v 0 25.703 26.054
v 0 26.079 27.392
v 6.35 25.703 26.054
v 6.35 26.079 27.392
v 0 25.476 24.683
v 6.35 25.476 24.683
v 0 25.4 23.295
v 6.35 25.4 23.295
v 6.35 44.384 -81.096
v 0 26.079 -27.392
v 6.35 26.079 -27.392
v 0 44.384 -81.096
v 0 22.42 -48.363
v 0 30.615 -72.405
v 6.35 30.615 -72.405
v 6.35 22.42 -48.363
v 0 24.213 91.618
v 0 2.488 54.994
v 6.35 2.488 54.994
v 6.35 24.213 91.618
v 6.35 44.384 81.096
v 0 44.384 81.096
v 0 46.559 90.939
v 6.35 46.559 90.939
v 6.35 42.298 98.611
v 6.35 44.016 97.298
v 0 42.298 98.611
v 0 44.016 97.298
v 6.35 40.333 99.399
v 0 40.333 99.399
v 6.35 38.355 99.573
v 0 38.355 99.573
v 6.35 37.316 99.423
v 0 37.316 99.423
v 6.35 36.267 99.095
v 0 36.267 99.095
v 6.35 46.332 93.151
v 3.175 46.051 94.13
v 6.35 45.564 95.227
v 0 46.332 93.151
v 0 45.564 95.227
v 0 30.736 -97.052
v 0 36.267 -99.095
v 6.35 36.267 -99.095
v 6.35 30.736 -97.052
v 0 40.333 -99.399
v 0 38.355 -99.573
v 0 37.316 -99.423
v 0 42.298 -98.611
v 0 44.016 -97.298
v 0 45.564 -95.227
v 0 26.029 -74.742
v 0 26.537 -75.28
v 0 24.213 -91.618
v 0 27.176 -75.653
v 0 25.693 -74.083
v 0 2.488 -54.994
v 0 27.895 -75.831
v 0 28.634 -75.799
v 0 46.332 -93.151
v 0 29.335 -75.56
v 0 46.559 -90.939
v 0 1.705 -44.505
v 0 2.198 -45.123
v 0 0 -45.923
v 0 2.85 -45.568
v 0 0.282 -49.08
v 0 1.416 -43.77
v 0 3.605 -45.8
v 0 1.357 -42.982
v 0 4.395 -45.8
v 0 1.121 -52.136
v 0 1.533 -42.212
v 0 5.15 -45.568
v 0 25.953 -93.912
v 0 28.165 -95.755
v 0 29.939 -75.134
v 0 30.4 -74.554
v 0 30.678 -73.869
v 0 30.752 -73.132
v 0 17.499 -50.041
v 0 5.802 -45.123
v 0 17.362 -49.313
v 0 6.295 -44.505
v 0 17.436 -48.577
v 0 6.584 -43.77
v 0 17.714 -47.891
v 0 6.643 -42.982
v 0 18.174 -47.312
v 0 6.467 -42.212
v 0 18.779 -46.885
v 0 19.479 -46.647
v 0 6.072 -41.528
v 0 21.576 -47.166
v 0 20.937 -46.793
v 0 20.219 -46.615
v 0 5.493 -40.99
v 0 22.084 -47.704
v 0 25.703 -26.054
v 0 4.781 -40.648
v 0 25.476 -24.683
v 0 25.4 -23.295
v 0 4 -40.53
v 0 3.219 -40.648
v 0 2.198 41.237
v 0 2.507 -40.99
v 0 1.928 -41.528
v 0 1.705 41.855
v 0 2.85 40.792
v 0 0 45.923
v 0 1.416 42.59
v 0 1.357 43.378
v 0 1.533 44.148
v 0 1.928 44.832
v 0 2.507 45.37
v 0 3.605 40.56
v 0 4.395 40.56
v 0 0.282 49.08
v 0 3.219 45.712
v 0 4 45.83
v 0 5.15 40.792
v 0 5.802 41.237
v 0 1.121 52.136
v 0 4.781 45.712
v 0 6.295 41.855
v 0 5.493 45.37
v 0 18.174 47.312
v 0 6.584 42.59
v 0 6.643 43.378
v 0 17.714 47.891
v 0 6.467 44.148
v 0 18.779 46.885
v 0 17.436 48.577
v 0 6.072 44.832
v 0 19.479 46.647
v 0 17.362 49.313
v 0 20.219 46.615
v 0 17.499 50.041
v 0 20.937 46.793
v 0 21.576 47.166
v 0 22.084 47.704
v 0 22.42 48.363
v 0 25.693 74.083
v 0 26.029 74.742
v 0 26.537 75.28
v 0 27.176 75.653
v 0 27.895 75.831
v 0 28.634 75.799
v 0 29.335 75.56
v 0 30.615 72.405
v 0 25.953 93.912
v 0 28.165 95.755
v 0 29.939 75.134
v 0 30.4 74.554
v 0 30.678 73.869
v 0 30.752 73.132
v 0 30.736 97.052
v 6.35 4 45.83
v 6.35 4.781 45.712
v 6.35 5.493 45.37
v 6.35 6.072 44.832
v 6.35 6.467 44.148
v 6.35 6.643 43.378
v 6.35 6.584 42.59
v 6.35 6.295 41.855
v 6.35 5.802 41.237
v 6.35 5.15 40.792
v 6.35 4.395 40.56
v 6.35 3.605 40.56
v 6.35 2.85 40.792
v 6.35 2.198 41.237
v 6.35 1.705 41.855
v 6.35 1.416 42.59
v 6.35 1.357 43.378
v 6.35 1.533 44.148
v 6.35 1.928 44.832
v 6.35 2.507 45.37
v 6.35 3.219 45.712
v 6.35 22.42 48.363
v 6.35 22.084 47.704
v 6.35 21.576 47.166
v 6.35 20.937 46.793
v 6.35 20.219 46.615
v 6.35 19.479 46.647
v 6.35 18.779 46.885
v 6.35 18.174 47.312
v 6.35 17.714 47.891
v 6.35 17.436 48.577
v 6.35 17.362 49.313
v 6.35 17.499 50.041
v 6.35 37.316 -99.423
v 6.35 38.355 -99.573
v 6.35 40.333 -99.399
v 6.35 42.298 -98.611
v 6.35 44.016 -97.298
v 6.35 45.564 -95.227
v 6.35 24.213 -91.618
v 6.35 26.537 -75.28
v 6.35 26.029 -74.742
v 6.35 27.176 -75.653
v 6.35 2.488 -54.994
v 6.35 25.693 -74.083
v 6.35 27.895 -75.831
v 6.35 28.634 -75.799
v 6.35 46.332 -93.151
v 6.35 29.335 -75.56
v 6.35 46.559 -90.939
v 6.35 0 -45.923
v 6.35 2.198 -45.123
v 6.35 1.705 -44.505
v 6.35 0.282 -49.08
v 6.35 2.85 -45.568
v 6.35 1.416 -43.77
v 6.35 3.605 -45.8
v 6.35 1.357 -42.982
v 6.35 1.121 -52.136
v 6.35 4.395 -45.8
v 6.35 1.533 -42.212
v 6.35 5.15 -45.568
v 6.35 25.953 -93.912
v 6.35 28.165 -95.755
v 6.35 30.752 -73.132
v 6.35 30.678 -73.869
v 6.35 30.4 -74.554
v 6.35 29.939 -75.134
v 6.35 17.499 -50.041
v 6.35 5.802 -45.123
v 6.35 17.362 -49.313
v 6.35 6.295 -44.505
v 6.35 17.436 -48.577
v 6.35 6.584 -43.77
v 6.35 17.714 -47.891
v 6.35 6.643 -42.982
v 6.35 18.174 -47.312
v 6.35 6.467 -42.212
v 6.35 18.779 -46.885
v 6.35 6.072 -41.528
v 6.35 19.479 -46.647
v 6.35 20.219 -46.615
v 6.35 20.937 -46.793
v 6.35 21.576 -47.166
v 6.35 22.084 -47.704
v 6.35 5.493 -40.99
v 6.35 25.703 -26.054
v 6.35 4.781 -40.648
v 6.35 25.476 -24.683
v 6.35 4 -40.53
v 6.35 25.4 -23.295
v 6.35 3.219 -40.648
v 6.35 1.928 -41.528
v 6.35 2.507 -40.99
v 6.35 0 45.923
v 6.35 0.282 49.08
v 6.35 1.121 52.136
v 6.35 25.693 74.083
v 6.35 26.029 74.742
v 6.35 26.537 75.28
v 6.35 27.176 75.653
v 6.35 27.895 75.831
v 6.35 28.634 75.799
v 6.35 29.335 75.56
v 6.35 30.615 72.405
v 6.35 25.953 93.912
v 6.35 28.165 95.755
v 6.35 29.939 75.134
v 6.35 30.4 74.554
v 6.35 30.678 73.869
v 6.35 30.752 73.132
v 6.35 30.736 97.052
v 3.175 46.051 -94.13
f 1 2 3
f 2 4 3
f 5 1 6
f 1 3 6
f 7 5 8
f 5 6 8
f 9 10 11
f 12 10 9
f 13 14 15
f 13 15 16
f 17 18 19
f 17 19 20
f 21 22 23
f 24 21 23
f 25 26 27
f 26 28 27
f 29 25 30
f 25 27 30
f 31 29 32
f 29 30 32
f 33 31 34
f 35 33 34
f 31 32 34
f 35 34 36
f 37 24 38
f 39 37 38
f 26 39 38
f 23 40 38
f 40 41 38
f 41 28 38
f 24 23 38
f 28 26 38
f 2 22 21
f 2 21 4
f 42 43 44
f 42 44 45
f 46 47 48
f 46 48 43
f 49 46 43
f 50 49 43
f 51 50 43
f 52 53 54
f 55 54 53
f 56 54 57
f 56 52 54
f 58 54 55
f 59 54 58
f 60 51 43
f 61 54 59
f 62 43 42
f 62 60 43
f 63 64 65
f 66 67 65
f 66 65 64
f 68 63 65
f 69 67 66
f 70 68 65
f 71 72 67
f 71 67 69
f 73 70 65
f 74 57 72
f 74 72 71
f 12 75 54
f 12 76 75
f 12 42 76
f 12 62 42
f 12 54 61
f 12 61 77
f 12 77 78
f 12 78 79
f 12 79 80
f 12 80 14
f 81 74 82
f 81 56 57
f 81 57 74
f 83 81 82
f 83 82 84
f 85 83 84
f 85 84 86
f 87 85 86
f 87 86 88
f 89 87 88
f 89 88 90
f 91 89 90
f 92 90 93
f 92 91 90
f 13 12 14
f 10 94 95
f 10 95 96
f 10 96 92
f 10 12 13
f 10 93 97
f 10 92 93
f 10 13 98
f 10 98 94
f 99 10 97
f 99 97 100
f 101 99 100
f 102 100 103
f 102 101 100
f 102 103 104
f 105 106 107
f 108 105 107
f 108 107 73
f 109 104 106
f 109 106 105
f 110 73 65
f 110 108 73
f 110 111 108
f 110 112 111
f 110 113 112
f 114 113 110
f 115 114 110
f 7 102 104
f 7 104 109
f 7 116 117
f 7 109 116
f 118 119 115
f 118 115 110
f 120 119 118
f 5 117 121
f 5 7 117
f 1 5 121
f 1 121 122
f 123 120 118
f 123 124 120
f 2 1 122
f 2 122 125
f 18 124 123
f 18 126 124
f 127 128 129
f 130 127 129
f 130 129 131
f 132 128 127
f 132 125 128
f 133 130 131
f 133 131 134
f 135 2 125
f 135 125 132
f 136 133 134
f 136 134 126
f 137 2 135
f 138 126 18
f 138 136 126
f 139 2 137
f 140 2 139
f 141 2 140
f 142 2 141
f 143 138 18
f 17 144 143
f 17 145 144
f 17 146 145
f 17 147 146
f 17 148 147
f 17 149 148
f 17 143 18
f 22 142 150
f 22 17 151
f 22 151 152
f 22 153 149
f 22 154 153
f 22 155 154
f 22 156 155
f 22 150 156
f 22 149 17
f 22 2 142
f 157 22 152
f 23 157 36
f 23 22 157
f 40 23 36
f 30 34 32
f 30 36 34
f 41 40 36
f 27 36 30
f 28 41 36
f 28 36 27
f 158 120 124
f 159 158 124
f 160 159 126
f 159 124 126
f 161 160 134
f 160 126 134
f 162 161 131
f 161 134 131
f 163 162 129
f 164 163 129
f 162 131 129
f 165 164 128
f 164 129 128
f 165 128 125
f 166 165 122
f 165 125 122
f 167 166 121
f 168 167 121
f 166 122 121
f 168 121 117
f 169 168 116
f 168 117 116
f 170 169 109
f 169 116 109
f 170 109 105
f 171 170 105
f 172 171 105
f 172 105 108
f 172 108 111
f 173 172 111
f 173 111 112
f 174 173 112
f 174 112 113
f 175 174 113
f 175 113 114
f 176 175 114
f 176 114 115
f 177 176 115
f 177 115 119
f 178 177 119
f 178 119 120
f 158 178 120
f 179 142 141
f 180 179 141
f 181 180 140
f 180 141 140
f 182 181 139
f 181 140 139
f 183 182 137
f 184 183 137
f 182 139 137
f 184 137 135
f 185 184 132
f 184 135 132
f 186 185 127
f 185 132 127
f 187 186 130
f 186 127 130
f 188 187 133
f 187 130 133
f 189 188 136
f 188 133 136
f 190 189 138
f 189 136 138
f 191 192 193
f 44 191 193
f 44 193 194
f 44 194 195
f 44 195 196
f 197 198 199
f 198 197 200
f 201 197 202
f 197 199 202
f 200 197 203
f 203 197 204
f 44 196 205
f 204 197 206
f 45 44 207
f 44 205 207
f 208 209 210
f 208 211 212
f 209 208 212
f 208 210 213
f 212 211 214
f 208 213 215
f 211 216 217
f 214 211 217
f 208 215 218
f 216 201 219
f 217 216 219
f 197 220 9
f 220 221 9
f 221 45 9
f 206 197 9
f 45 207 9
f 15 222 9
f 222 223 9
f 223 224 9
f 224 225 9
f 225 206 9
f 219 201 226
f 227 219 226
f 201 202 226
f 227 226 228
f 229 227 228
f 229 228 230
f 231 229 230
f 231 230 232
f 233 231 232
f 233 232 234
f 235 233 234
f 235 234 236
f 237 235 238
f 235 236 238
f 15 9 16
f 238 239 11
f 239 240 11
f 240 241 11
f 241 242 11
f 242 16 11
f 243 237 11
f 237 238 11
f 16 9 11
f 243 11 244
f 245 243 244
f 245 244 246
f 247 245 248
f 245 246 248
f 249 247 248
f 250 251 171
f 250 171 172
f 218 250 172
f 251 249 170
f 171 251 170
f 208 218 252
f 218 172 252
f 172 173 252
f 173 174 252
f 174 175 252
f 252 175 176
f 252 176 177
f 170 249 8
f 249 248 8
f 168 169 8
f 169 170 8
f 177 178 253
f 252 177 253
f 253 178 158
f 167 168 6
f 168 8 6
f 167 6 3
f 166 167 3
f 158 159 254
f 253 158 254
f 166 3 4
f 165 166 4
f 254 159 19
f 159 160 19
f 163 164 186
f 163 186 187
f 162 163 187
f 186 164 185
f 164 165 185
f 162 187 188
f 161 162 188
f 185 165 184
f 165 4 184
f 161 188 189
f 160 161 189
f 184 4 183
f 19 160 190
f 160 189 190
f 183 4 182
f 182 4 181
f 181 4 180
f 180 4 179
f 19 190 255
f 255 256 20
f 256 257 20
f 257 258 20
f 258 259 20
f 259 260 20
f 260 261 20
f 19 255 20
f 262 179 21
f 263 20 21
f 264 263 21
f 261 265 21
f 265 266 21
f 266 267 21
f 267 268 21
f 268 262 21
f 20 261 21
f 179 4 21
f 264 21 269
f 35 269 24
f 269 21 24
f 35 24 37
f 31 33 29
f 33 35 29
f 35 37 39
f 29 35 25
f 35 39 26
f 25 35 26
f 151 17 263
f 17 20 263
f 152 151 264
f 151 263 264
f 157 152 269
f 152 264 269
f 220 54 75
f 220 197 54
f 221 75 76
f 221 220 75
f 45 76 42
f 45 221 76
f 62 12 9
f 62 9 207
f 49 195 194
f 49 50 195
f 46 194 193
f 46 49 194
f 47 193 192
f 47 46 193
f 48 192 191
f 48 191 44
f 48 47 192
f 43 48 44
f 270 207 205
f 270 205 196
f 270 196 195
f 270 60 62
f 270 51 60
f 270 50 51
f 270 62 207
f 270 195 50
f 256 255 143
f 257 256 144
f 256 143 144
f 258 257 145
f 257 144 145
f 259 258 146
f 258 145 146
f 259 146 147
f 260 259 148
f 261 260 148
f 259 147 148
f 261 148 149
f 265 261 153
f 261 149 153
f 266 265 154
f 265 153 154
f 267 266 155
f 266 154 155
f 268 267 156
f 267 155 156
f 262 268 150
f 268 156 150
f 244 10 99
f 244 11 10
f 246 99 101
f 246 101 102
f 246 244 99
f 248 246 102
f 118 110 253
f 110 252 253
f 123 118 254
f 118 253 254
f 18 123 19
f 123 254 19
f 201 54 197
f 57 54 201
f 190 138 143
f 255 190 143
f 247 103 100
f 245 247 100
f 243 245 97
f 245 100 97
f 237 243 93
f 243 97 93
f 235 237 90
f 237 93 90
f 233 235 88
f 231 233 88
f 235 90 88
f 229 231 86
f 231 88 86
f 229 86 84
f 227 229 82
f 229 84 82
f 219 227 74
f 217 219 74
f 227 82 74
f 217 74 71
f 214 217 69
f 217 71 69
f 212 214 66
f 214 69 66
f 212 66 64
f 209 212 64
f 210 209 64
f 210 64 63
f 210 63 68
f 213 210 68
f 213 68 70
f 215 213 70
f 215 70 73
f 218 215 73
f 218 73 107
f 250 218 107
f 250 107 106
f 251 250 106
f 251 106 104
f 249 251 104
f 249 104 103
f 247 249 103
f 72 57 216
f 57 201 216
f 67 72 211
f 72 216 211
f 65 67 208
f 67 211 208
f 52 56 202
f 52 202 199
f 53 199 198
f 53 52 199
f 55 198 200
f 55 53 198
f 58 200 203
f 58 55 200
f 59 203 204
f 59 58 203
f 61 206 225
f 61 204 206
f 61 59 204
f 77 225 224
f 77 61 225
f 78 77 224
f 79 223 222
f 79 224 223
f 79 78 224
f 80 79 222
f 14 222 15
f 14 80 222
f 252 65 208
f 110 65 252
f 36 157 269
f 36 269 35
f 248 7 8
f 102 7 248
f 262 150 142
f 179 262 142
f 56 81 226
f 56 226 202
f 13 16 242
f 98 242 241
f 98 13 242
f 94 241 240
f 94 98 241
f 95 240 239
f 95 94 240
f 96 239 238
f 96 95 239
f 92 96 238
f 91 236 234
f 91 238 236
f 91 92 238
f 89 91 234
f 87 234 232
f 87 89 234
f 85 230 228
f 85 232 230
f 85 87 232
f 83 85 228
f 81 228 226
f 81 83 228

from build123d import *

# Parameters (mm, degrees)
BOSS_EXTRUDE1_DEPTH = 6.35
SLOTS_DEPTH         = 7.3500001
SKETCH3_R           = 2.65
HOLES_DEPTH         = 7.3500001
FILLET1_R           = 12.7
FILLET2_R           = 17.78


with BuildPart() as part:
    # Sketch1 → Boss-Extrude1 (new body)
    with BuildSketch(Plane(origin=(0, 0, 0), x_dir=(0, 0, -1), z_dir=(1, 0, 0))):
        with BuildLine():
            Line((50.8, 0), (-50.8, 0))
            Line((-50.8, 0), (-95.491911785, 26.510580519))
            Line((-95.491911785, 26.510580519), (-99.095159206, 36.267222623))
            add(Edge.make_bspline(
                [(-81.095679658, 44.383857392), (-84.793404741, 45.36773864), (-94.554651266, 49.479684382), (-100.787803101, 40.484157915), (-99.095159206, 36.267222623)],
                knots=[0, 0, 0, 0, 0.528781937, 1, 1, 1, 1], degree=3))
            Line((-81.095679658, 44.383857392), (-25.4, 25.4))
            Line((-25.4, 25.4), (25.4, 25.4))
            Line((25.4, 25.4), (81.095679658, 44.383857392))
            add(Edge.make_bspline(
                [(81.095679658, 44.383857392), (84.793404741, 45.36773864), (94.554651266, 49.479684382), (100.787803101, 40.484157915), (99.095159206, 36.267222623)],
                knots=[0, 0, 0, 0, 0.528781937, 1, 1, 1, 1], degree=3))
            Line((99.095159206, 36.267222623), (95.491911785, 26.510580519))
            Line((95.491911785, 26.510580519), (50.8, 0))
        make_face()
    extrude(amount=BOSS_EXTRUDE1_DEPTH)

    # Sketch2 → slots (cut, through all)
    with BuildSketch(Plane.ZY):
        with BuildLine():
            Line((-72.404954671, 30.615105796), (-48.363160058, 22.420466586))
            ThreePointArc((-48.363160058, 22.420466586), (-46.741010292, 19.120674147), (-50.040802731, 17.498524382))
            Line((-50.040802731, 17.498524382), (-74.082597344, 25.693163592))
            ThreePointArc((-74.082597344, 25.693163592), (-75.70474711, 28.992956031), (-72.404954671, 30.615105796))
        make_face()
        with BuildLine():
            Line((72.404954671, 30.615105796), (48.363160058, 22.420466586))
            ThreePointArc((48.363160058, 22.420466586), (46.741010292, 19.120674147), (50.040802731, 17.498524382))
            Line((50.040802731, 17.498524382), (74.082597344, 25.693163592))
            ThreePointArc((74.082597344, 25.693163592), (75.70474711, 28.992956031), (72.404954671, 30.615105796))
        make_face()
    extrude(amount=-SLOTS_DEPTH, mode=Mode.SUBTRACT)

    # Sketch3 → holes (cut, through all)
    with BuildSketch(Plane.ZY):
        with Locations((-43.18, 4)):
            Circle(SKETCH3_R)
        with Locations((43.18, 4)):
            Circle(SKETCH3_R)
    extrude(amount=-HOLES_DEPTH, mode=Mode.SUBTRACT)

    # Fillet1
    fillet1_edges = [part.edges().sort_by_distance(p)[0] for p in [
        (3.175, 26.510580519, 95.491911785),
        (3.175, 25.4, 25.4),
        (3.175, 25.4, -25.4),
        (3.175, 26.510580519, -95.491911785),
    ]]
    fillet(fillet1_edges, radius=FILLET1_R)

    # Fillet2
    fillet2_edges = [part.edges().sort_by_distance(p)[0] for p in [
        (3.175, 0, -50.8),
        (3.175, 0, 50.8),
    ]]
    fillet(fillet2_edges, radius=FILLET2_R)


solid = part.part
